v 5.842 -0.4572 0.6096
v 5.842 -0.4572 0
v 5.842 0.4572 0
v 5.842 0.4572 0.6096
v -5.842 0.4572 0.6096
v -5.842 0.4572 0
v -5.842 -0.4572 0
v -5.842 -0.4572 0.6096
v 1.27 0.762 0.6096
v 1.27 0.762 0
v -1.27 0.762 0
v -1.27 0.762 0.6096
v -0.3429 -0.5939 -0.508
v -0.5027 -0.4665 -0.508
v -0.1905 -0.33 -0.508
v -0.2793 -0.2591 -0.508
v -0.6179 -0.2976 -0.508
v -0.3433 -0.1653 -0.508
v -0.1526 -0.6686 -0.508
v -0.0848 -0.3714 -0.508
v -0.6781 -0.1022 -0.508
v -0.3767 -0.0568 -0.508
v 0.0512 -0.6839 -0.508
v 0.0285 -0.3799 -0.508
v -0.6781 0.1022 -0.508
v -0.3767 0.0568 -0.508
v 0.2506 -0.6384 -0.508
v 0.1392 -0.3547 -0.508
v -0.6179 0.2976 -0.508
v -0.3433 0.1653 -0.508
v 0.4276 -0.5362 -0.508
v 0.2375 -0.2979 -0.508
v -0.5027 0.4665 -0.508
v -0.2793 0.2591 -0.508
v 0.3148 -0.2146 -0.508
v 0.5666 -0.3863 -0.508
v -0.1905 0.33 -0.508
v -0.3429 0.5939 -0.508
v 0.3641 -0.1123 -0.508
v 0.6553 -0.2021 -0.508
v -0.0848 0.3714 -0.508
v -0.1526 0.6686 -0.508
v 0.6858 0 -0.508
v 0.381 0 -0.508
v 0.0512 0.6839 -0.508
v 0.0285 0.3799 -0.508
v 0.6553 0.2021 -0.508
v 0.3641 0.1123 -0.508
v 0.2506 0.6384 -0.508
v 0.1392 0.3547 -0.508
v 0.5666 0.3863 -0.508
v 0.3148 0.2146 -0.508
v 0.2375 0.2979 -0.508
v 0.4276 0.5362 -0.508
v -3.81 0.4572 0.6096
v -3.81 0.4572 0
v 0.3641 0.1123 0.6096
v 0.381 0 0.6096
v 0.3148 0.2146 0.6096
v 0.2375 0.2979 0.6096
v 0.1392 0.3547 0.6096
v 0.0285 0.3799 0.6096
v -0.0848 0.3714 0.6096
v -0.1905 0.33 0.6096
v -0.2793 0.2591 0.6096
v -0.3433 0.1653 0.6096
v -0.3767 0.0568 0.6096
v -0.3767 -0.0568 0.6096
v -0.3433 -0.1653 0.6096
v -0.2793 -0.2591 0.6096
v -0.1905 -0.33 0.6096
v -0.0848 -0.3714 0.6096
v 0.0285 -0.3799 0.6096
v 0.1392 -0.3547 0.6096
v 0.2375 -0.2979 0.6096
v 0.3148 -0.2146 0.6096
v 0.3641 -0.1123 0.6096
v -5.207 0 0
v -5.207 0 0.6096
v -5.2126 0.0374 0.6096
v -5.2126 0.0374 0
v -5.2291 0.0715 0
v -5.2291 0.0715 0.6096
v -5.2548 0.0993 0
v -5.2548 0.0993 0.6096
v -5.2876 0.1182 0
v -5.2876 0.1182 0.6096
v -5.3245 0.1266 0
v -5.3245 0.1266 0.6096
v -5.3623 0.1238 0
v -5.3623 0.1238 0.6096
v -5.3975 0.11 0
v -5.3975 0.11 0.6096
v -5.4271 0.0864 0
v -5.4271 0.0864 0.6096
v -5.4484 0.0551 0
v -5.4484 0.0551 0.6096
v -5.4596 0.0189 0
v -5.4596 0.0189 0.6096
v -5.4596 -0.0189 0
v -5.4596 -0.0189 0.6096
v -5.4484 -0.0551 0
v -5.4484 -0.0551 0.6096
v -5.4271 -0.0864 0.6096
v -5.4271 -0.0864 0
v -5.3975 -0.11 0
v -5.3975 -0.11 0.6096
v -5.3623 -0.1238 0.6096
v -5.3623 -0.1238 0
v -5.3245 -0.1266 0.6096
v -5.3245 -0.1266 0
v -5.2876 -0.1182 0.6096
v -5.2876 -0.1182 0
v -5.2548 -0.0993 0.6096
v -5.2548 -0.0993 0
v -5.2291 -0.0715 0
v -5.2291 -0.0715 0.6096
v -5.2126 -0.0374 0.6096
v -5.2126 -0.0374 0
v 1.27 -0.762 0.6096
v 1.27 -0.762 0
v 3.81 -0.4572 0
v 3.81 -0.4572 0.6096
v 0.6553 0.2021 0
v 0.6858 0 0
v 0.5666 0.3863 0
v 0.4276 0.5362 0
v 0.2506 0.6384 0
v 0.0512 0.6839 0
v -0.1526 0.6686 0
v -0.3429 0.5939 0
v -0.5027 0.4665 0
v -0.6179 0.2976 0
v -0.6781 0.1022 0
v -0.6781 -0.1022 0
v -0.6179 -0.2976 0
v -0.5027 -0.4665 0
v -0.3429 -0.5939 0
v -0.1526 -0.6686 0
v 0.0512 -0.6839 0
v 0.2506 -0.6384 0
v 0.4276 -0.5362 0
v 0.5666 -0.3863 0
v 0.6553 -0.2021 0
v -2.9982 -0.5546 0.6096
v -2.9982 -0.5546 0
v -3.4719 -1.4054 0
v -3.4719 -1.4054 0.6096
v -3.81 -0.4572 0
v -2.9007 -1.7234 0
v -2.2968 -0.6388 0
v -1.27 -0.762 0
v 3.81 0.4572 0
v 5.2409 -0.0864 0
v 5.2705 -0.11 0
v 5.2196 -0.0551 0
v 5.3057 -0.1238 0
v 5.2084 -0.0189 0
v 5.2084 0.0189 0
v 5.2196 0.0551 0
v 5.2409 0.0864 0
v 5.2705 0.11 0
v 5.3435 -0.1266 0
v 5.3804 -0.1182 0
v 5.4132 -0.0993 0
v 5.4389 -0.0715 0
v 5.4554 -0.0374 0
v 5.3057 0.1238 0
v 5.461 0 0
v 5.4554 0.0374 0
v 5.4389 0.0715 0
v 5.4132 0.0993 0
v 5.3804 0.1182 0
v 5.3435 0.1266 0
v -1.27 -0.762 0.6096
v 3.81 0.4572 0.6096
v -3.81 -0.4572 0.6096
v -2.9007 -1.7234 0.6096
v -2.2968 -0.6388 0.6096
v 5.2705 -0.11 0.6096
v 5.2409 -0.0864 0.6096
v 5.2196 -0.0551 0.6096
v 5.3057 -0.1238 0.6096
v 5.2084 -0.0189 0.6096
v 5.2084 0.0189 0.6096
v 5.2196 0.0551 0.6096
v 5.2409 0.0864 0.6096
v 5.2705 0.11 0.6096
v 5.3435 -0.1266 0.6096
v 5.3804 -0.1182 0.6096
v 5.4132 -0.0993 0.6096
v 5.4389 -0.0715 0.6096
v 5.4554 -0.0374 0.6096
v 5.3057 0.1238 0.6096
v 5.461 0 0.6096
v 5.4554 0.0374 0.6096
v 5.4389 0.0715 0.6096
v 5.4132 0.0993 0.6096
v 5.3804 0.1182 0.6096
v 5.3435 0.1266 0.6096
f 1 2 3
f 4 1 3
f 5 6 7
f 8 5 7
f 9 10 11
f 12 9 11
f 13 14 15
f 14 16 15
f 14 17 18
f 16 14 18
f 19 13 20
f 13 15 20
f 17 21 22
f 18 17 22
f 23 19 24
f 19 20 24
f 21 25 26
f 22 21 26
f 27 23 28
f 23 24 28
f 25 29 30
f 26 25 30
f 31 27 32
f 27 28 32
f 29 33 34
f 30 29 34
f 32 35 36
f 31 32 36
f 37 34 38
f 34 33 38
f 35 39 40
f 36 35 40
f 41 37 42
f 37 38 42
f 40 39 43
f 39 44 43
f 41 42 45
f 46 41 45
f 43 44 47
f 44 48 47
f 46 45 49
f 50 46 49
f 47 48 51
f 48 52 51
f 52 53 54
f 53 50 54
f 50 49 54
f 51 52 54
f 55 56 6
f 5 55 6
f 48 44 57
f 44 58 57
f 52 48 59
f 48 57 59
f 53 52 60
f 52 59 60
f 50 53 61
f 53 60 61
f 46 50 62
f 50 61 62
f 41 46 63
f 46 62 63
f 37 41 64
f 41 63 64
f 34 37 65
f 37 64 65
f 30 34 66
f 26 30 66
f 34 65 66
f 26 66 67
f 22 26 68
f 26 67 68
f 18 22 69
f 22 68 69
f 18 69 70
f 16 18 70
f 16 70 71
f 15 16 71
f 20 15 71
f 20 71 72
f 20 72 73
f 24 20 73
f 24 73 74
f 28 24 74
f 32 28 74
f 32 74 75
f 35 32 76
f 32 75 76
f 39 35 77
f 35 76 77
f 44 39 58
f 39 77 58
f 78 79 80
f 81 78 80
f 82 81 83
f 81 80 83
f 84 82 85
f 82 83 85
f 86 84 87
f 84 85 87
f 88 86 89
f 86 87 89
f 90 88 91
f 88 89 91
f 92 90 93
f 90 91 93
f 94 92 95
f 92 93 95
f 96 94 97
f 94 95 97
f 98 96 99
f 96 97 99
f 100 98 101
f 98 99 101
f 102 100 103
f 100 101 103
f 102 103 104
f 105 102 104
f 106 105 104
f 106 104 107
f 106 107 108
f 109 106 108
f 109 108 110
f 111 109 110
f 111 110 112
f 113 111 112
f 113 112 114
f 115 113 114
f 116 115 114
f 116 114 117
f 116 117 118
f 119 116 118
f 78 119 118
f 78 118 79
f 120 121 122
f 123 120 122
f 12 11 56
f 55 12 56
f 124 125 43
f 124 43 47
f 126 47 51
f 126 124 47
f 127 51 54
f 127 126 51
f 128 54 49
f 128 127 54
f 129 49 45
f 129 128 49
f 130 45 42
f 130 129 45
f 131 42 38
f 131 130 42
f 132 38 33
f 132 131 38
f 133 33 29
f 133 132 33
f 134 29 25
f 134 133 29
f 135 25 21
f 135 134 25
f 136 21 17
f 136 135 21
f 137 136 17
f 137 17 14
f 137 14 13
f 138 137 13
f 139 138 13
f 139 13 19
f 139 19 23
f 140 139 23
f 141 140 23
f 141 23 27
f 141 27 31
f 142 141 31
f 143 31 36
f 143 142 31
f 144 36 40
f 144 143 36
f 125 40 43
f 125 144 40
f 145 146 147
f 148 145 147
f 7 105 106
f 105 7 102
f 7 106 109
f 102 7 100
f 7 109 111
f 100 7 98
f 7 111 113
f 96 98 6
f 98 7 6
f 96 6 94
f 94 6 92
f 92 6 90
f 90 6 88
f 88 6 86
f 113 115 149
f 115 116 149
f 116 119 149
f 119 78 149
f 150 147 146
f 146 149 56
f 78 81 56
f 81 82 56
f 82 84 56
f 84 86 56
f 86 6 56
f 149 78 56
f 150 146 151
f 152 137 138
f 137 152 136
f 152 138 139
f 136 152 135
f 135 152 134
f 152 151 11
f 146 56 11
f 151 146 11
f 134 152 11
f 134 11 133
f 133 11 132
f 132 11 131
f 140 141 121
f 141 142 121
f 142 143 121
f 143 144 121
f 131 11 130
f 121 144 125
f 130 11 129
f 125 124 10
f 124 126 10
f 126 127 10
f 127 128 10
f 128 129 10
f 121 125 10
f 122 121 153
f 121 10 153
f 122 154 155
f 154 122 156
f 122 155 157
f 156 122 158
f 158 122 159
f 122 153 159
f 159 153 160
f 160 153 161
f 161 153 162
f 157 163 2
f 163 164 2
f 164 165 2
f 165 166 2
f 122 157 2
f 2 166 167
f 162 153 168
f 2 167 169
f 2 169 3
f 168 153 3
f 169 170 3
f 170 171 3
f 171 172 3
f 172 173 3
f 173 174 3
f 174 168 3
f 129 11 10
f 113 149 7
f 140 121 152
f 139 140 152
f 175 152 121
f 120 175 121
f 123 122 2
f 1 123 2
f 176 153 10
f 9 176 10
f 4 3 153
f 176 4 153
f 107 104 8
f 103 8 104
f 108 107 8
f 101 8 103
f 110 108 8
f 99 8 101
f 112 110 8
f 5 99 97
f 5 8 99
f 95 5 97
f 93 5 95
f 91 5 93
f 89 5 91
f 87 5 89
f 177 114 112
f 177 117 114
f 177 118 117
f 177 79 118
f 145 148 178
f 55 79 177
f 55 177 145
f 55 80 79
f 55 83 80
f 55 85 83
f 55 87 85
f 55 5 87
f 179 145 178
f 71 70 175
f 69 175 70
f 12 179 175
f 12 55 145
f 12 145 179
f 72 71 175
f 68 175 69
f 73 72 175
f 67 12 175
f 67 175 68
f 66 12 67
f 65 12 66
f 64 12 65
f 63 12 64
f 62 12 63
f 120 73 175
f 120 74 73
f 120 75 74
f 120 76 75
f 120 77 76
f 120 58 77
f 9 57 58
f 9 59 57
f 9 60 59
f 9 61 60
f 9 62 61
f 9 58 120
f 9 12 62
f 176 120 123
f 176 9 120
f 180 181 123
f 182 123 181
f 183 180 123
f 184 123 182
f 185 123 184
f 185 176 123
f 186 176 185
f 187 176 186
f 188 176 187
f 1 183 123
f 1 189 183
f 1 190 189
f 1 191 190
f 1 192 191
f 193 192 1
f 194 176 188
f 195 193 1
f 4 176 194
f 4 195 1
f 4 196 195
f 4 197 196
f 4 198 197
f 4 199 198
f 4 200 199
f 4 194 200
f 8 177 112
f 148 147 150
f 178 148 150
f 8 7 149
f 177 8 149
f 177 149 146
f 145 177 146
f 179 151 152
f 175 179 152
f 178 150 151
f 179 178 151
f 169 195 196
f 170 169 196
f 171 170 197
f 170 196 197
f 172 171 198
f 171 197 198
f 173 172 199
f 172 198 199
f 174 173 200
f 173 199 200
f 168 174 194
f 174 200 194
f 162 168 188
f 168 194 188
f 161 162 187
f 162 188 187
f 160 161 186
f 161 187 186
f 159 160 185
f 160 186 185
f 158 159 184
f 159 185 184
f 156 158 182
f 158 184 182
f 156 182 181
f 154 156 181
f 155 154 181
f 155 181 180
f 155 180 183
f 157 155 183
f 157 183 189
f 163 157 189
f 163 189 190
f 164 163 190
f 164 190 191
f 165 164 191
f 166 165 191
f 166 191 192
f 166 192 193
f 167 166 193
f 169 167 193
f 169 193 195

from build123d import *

# Parameters (mm, degrees)
F1_DEPTH = 0.6096
F2_R     = 0.381
F3_DEPTH = 25.4
F4_R     = 0.127
F5_DEPTH = 2.54
F6_R     = 0.6858
F6_R_2   = 0.381
F7_DEPTH = 0.508


with BuildPart() as f1:
    # F0 (on Top) → F1 (new body)
    with BuildSketch(Plane.XY):
        Polygon((1.27, 0.762), (-1.27, 0.762), (-3.81, 0.4572), (-5.842, 0.4572), (-5.842, -0.4572), (-3.81, -0.4572), (-2.998233, -0.554612), (-2.296821, -0.638781), (-1.27, -0.762), (1.27, -0.762), (3.81, -0.4572), (5.842, -0.4572), (5.842, 0.4572), (3.81, 0.4572), align=None)
        Polygon((-2.296821, -0.638781), (-2.998233, -0.554612), (-3.471884, -1.405351), (-2.900672, -1.723375), align=None)
    extrude(amount=F1_DEPTH)

    # F2 (on face) → F3 (cut)
    with BuildSketch(Plane.XY.offset(0.6096)):
        Circle(F2_R)
    extrude(amount=-F3_DEPTH, mode=Mode.SUBTRACT)

    # F4 (on face) → F5 (cut)
    with BuildSketch(Plane.XY.offset(0.6096)):
        with Locations((-5.334, 0)):
            Circle(F4_R)
        with Locations((5.334, 0)):
            Circle(F4_R)
    extrude(amount=-F5_DEPTH, mode=Mode.SUBTRACT)

    # F6 (on Top) → F7 (join)
    with BuildSketch(Plane.XY):
        Circle(F6_R)
        Circle(F6_R_2, mode=Mode.SUBTRACT)
    extrude(amount=-F7_DEPTH)


solid = f1.part
